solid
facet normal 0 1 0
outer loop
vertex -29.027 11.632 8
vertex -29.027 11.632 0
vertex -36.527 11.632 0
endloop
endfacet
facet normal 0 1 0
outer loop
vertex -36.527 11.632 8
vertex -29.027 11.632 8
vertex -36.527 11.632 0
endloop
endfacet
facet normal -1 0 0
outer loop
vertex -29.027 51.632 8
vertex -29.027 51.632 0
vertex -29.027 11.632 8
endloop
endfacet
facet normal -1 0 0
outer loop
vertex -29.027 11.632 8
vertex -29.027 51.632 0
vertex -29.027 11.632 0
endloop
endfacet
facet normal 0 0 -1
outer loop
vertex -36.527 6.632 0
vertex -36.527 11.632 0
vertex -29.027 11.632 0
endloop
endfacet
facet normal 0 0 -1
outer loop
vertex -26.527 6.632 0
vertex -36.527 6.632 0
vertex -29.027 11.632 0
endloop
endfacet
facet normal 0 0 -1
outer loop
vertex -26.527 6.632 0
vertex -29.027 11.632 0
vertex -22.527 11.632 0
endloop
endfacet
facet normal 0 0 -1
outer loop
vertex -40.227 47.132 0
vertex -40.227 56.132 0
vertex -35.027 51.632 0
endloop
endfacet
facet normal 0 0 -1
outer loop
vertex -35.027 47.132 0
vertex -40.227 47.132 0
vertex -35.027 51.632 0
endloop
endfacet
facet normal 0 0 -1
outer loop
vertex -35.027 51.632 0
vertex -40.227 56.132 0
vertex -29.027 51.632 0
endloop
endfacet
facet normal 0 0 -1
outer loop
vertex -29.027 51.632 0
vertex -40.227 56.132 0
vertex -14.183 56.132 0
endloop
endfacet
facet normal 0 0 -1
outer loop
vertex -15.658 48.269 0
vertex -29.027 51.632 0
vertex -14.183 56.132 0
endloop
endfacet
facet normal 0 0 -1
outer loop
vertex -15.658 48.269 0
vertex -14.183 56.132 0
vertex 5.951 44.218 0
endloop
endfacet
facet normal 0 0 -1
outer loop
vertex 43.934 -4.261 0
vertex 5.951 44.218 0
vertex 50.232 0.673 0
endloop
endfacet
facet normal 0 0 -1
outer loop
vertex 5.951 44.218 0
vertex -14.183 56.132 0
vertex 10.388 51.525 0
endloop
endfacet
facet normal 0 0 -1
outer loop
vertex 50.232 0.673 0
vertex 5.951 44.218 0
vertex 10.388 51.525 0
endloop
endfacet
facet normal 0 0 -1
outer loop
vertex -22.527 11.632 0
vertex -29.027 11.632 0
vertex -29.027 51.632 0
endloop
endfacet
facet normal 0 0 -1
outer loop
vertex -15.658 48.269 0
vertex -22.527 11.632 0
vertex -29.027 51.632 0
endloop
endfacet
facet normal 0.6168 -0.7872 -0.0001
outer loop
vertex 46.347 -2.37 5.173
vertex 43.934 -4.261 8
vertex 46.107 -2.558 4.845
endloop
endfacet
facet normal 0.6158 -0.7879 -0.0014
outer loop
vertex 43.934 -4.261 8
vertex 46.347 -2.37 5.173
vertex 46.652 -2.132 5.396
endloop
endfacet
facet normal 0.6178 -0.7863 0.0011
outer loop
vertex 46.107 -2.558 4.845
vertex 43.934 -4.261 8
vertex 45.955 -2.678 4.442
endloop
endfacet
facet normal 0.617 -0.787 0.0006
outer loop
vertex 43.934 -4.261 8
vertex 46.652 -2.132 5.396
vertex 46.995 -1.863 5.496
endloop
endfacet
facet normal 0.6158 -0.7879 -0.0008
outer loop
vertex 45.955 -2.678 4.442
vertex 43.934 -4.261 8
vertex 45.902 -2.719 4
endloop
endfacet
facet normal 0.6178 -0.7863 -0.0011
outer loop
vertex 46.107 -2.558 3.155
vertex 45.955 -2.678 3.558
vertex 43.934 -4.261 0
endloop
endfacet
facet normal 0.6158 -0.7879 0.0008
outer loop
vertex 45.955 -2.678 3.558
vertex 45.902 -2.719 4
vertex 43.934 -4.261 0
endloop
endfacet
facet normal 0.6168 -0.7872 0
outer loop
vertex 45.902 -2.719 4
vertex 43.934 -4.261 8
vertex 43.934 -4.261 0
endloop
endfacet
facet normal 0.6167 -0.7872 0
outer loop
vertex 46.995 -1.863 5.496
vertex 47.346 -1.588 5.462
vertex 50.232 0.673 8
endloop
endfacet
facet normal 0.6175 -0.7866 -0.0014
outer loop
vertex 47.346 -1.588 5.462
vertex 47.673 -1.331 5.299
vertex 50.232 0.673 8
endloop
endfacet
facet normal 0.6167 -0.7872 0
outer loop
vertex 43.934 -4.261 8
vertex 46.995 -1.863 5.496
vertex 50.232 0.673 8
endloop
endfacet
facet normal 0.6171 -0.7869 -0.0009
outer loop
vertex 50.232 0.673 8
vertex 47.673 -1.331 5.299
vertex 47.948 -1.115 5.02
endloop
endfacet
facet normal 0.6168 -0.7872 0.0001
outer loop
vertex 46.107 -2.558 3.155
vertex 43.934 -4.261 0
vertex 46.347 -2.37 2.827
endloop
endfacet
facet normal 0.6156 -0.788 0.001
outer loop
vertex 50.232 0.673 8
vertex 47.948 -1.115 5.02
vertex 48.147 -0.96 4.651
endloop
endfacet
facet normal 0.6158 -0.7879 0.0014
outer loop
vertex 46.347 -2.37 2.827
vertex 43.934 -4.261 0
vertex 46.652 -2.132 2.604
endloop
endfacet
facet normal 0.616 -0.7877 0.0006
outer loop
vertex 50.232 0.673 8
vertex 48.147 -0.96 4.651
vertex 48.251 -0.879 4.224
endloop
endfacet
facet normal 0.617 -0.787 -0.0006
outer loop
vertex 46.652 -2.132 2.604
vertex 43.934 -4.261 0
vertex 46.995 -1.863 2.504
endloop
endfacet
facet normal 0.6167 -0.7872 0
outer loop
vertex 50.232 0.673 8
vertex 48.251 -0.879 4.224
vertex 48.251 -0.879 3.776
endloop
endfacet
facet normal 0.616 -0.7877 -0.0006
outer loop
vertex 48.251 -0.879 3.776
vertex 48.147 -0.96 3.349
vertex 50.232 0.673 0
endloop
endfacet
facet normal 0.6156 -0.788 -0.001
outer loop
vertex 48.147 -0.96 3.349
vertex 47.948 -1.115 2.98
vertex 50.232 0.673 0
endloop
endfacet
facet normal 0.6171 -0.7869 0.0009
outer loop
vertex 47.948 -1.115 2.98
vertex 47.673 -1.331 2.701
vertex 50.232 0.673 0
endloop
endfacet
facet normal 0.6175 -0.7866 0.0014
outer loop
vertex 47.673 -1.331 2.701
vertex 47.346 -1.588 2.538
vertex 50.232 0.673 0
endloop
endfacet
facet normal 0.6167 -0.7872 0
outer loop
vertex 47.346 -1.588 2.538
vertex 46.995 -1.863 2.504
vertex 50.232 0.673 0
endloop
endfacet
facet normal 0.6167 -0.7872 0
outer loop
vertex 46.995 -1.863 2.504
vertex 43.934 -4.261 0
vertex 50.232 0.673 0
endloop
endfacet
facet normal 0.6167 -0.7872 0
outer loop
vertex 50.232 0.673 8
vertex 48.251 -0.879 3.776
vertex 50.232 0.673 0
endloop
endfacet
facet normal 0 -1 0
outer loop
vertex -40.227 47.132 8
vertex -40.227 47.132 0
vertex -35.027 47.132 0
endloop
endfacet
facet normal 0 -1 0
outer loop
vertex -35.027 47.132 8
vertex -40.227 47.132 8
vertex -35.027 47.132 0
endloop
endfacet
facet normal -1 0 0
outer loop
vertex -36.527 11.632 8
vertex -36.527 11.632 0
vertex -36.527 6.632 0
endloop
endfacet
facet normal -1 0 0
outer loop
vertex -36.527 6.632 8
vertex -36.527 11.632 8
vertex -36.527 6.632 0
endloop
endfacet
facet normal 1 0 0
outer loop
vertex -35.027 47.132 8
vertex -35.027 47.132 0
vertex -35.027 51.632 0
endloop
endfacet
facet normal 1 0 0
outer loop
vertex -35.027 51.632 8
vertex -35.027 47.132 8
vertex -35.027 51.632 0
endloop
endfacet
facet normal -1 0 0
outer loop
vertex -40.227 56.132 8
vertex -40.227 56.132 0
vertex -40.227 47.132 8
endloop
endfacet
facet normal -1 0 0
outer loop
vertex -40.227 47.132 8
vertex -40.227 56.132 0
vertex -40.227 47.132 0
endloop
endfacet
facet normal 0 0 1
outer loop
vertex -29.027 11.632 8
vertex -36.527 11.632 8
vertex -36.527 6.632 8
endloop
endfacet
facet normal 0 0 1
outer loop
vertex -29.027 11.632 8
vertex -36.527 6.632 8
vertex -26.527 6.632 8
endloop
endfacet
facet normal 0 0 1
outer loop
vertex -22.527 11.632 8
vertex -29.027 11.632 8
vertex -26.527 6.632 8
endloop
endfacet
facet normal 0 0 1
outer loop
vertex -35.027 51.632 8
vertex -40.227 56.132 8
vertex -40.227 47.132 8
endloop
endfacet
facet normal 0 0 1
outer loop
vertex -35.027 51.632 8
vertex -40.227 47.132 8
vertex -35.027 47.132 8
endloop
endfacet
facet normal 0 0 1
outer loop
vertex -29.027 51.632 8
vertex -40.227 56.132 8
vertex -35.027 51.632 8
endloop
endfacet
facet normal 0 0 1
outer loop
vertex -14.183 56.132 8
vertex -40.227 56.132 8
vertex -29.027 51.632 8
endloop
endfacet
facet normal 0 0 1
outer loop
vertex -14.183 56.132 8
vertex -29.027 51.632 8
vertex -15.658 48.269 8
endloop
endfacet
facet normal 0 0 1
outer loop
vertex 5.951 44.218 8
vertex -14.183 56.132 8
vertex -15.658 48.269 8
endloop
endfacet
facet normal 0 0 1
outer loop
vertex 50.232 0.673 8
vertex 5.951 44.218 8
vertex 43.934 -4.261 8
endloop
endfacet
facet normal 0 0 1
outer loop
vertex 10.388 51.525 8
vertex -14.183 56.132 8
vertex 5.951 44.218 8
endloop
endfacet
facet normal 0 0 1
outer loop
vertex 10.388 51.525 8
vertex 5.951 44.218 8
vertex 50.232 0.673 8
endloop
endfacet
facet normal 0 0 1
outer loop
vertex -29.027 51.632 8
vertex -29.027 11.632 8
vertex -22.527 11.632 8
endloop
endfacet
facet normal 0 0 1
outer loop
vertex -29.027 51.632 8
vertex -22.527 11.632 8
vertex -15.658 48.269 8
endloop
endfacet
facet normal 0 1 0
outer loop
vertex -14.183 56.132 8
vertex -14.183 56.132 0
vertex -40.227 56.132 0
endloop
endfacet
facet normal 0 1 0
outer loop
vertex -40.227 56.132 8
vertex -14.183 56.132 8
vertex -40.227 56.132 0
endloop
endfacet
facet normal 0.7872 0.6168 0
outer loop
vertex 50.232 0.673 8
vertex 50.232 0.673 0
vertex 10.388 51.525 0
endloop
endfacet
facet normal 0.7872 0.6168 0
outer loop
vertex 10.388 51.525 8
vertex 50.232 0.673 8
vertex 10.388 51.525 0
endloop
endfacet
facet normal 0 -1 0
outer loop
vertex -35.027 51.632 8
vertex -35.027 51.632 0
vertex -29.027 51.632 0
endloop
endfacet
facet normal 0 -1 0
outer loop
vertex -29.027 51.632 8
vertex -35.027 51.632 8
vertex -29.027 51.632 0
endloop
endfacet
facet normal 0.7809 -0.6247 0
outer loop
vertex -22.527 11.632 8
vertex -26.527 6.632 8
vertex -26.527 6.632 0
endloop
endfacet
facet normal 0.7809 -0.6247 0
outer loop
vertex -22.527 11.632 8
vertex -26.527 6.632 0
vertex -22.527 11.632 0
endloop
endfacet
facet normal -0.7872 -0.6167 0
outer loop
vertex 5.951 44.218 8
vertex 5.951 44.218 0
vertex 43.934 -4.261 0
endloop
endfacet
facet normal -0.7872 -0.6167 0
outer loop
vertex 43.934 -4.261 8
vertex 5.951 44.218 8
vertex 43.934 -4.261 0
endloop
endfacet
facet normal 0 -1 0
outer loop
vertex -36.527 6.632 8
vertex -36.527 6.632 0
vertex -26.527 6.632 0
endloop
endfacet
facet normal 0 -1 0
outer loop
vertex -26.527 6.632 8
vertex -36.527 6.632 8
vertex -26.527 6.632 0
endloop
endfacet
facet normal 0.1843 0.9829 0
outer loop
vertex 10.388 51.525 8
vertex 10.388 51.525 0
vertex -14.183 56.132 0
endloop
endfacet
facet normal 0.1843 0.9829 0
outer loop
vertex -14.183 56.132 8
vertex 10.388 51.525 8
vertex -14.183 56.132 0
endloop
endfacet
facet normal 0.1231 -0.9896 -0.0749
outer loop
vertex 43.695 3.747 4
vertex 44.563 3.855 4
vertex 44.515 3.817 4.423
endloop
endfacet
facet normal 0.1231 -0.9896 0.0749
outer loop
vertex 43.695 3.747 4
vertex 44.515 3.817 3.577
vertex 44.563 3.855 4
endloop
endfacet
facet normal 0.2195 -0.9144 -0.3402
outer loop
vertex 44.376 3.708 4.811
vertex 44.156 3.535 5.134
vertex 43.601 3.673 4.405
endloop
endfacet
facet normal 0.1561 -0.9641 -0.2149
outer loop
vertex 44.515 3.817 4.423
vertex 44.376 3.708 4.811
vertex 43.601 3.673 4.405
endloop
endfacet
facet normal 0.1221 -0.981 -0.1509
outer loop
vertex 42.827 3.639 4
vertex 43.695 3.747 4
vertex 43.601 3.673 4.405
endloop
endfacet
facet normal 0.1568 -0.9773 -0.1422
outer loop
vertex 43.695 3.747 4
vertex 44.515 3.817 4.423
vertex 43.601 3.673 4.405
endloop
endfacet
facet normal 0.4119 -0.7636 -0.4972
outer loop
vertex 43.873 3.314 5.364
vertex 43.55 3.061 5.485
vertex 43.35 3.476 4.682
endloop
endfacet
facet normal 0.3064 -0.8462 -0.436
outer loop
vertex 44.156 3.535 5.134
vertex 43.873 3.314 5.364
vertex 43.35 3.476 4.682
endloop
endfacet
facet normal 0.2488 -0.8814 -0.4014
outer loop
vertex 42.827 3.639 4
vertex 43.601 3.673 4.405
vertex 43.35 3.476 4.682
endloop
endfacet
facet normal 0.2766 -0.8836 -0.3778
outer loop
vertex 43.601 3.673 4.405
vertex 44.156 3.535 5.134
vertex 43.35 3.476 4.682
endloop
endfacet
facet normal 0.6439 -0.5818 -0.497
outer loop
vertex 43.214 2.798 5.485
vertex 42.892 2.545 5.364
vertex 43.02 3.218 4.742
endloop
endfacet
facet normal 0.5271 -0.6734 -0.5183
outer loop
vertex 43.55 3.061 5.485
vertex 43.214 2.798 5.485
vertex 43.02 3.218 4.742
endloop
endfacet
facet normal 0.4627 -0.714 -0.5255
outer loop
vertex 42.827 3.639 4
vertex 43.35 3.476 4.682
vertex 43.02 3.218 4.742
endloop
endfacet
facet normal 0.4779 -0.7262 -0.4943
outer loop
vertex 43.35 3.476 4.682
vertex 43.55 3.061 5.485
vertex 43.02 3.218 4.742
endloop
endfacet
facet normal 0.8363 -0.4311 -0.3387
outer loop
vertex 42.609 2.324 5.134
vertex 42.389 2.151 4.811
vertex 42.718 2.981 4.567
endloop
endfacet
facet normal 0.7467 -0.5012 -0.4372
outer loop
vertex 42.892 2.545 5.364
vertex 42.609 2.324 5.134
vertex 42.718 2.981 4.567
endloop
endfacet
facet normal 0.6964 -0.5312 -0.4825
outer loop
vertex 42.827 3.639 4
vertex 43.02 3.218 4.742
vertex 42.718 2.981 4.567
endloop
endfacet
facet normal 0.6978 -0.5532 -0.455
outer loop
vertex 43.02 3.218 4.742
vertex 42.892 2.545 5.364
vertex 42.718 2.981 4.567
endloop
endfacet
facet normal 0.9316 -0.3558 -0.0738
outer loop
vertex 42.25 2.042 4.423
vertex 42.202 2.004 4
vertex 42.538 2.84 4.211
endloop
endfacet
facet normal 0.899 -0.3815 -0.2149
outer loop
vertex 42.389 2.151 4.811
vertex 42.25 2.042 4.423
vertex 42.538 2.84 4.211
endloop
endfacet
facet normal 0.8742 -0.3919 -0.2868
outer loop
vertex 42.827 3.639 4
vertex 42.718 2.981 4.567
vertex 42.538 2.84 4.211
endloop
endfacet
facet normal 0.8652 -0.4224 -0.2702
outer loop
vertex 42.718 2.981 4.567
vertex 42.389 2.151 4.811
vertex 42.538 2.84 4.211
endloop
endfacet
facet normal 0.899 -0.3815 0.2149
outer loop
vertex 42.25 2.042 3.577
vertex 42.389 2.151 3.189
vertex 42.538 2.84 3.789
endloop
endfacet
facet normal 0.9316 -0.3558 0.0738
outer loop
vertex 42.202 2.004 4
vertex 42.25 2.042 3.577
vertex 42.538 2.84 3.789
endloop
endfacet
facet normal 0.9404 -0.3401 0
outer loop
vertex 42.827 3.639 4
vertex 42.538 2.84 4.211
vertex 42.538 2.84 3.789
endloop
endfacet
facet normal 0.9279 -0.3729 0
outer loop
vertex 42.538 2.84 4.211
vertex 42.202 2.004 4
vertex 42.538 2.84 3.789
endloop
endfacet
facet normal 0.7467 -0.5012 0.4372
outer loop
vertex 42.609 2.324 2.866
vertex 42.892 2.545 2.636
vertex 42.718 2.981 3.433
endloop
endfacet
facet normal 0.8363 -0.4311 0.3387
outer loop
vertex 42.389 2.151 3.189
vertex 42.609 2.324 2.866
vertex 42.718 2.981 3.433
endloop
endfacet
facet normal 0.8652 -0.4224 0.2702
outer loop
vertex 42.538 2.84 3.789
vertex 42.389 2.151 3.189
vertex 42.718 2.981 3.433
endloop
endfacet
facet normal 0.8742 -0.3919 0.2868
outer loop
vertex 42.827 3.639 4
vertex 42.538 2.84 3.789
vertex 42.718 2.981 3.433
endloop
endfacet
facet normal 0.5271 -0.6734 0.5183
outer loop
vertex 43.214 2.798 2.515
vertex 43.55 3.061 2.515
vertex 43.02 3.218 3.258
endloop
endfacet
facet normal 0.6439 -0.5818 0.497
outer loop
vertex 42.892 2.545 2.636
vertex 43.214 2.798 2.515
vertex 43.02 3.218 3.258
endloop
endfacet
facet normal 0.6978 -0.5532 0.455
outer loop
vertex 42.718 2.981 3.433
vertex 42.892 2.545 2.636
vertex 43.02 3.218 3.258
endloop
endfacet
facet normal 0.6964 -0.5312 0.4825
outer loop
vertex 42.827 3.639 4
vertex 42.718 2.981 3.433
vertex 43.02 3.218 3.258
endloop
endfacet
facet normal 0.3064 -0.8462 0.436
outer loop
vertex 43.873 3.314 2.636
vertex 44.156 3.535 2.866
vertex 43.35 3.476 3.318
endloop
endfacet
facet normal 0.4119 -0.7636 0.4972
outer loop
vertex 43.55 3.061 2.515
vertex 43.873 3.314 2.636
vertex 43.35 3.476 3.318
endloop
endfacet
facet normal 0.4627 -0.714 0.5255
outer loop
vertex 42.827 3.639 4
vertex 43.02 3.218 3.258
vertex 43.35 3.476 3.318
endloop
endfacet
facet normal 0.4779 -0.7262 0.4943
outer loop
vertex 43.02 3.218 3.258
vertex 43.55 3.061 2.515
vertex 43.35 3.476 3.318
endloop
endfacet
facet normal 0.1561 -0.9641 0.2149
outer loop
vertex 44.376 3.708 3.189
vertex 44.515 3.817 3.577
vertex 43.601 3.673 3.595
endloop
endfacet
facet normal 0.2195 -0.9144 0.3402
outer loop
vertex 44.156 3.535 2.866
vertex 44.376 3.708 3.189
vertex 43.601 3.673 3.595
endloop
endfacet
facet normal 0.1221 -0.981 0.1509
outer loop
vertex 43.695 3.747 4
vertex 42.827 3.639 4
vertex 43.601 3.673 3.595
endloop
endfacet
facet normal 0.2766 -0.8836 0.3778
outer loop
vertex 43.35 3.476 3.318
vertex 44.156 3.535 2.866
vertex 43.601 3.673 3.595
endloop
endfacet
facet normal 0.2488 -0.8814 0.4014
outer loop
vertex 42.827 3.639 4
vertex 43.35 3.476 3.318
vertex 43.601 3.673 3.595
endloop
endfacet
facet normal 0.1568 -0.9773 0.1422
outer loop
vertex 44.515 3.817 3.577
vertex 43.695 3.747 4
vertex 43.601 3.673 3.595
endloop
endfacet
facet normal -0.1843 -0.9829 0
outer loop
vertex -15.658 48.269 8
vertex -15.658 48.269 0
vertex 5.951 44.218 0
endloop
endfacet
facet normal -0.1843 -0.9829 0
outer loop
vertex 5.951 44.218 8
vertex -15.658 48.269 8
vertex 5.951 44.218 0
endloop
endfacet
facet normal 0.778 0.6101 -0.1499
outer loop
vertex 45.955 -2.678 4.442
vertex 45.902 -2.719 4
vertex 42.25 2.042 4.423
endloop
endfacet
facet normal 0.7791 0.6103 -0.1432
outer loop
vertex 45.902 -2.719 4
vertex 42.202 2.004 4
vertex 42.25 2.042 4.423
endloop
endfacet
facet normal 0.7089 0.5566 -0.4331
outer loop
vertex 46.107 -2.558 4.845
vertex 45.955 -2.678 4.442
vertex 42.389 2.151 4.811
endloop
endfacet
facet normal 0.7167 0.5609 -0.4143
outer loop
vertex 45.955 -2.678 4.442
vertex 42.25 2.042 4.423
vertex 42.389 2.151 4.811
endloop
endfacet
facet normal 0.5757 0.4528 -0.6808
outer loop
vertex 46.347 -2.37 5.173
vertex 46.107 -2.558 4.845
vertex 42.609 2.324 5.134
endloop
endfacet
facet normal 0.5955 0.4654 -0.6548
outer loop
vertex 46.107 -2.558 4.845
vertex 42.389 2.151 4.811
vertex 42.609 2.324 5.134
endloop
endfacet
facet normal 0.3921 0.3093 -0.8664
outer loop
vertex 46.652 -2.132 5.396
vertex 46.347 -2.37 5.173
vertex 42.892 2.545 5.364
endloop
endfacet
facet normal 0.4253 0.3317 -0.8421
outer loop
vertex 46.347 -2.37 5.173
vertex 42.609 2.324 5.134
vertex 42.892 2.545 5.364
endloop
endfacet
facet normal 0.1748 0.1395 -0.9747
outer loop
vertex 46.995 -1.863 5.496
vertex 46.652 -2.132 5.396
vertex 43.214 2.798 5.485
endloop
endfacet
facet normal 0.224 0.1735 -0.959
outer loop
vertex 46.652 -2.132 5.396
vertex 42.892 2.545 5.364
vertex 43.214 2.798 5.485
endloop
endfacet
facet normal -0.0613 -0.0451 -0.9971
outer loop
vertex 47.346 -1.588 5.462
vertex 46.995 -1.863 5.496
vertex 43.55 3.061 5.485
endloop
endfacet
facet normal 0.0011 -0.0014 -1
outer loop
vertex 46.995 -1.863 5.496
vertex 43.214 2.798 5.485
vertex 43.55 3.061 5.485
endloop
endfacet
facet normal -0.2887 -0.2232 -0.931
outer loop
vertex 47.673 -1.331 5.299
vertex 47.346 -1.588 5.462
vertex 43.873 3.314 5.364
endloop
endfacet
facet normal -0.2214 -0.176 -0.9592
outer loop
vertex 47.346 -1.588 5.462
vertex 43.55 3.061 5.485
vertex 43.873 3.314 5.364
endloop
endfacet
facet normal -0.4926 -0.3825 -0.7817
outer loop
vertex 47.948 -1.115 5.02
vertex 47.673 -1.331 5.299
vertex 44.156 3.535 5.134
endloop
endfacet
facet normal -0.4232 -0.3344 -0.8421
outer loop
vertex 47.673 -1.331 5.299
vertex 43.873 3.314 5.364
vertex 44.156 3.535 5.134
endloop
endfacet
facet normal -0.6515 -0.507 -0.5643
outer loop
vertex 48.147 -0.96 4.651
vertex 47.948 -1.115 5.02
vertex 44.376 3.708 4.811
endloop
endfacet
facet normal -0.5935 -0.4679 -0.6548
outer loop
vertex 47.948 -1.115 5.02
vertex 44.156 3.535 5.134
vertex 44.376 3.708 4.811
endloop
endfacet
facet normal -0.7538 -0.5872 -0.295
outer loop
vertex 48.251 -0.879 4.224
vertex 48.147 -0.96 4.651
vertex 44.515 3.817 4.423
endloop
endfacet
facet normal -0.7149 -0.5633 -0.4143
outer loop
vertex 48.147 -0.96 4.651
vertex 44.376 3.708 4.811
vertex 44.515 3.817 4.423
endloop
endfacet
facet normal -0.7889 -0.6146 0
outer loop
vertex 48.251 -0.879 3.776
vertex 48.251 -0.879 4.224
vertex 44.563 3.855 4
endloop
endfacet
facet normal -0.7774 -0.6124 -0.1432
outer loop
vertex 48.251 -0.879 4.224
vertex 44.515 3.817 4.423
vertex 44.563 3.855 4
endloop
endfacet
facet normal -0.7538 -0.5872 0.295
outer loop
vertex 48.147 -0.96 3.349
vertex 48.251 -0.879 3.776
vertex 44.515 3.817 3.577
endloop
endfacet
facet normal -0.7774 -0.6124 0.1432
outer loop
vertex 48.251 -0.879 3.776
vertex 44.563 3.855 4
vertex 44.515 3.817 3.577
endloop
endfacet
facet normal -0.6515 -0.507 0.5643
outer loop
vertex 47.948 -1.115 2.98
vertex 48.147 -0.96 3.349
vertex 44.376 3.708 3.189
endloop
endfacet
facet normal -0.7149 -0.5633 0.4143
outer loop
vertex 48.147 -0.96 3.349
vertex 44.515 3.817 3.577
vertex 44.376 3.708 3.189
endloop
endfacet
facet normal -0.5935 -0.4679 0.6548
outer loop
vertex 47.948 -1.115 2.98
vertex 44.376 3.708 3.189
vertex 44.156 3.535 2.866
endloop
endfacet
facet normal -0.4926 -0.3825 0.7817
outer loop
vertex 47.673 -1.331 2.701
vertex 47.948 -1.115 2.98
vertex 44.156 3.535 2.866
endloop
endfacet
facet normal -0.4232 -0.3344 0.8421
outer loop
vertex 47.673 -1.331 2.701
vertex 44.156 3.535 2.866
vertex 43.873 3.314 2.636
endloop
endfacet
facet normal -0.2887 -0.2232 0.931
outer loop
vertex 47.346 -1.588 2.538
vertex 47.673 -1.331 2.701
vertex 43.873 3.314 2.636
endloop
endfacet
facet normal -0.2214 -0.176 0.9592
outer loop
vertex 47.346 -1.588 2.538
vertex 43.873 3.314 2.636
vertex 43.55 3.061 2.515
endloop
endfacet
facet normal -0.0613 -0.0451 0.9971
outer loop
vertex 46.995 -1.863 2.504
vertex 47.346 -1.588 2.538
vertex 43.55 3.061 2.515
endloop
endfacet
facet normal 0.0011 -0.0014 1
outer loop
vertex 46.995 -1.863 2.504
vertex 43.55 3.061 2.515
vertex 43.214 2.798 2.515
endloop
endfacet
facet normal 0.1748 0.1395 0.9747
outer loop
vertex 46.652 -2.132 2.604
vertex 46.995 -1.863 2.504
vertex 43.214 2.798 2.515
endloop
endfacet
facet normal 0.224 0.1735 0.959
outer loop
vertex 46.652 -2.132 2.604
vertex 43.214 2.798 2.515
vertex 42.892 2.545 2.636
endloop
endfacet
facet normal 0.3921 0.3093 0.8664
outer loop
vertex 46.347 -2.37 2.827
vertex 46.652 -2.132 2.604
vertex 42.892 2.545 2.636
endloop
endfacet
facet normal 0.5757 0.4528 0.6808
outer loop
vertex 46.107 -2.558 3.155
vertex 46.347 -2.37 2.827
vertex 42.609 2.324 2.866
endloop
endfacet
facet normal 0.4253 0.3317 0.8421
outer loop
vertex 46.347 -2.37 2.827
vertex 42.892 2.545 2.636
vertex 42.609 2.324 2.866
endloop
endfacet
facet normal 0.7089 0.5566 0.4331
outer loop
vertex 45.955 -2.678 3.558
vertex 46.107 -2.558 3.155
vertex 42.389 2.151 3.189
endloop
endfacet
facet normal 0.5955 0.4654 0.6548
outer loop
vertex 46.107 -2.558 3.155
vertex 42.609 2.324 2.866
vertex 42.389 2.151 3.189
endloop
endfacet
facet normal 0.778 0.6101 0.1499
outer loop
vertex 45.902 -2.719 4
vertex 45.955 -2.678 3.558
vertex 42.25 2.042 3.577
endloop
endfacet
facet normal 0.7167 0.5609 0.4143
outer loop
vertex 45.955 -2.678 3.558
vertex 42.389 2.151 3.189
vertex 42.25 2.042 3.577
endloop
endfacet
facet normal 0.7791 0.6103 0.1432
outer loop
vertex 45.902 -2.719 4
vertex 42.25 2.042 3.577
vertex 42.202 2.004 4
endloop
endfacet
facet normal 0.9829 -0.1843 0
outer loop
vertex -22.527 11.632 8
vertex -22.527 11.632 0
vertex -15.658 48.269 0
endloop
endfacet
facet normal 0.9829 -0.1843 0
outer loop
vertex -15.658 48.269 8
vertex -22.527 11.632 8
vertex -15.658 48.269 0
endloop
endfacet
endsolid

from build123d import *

# Parameters (mm, degrees)
F1_DEPTH = 8
F3_D     = 3
F3_DEPTH = 6
F3_TIP   = 0.9012909285


with BuildPart() as f1:
    # F0 (on Top) → F1 (new body)
    with BuildSketch(Plane.XY):
        Polygon((-35.0272064194, 47.1324694753), (-35.0272064194, 51.6324694753), (-29.0272064194, 51.6324694753), (-29.0272064194, 11.6324694753), (-36.5272064194, 11.6324694753), (-36.5272064194, 6.6324694753), (-26.5272064194, 6.6324694753), (-22.5272064194, 11.6324694753), (-15.6577646998, 48.2694919798), (5.9506252409, 44.2179188659), (43.934325687, -4.2605536739), (50.2315890367, 0.6734583148), (10.388348254, 51.525256099), (-14.1834564194, 56.1324694753), (-40.2272064194, 56.1324694753), (-40.2272064194, 47.1324694753), align=None)
    extrude(amount=F1_DEPTH)

    # F3
    with Locations(Plane(origin=(18.7802618476, -23.969186719, 0), x_dir=(0.7871579187, 0.6167514986, 0), z_dir=(0.6167514986, -0.7871579187, 0))):
        with Locations((35.9555495046, 4)):
            Hole(F3_D / 2, depth=F3_DEPTH)
            with Locations((0, 0, -(F3_DEPTH + F3_TIP / 2))):  # 118° drill point
                Cone(0, F3_D / 2, F3_TIP, mode=Mode.SUBTRACT)


solid = f1.part
